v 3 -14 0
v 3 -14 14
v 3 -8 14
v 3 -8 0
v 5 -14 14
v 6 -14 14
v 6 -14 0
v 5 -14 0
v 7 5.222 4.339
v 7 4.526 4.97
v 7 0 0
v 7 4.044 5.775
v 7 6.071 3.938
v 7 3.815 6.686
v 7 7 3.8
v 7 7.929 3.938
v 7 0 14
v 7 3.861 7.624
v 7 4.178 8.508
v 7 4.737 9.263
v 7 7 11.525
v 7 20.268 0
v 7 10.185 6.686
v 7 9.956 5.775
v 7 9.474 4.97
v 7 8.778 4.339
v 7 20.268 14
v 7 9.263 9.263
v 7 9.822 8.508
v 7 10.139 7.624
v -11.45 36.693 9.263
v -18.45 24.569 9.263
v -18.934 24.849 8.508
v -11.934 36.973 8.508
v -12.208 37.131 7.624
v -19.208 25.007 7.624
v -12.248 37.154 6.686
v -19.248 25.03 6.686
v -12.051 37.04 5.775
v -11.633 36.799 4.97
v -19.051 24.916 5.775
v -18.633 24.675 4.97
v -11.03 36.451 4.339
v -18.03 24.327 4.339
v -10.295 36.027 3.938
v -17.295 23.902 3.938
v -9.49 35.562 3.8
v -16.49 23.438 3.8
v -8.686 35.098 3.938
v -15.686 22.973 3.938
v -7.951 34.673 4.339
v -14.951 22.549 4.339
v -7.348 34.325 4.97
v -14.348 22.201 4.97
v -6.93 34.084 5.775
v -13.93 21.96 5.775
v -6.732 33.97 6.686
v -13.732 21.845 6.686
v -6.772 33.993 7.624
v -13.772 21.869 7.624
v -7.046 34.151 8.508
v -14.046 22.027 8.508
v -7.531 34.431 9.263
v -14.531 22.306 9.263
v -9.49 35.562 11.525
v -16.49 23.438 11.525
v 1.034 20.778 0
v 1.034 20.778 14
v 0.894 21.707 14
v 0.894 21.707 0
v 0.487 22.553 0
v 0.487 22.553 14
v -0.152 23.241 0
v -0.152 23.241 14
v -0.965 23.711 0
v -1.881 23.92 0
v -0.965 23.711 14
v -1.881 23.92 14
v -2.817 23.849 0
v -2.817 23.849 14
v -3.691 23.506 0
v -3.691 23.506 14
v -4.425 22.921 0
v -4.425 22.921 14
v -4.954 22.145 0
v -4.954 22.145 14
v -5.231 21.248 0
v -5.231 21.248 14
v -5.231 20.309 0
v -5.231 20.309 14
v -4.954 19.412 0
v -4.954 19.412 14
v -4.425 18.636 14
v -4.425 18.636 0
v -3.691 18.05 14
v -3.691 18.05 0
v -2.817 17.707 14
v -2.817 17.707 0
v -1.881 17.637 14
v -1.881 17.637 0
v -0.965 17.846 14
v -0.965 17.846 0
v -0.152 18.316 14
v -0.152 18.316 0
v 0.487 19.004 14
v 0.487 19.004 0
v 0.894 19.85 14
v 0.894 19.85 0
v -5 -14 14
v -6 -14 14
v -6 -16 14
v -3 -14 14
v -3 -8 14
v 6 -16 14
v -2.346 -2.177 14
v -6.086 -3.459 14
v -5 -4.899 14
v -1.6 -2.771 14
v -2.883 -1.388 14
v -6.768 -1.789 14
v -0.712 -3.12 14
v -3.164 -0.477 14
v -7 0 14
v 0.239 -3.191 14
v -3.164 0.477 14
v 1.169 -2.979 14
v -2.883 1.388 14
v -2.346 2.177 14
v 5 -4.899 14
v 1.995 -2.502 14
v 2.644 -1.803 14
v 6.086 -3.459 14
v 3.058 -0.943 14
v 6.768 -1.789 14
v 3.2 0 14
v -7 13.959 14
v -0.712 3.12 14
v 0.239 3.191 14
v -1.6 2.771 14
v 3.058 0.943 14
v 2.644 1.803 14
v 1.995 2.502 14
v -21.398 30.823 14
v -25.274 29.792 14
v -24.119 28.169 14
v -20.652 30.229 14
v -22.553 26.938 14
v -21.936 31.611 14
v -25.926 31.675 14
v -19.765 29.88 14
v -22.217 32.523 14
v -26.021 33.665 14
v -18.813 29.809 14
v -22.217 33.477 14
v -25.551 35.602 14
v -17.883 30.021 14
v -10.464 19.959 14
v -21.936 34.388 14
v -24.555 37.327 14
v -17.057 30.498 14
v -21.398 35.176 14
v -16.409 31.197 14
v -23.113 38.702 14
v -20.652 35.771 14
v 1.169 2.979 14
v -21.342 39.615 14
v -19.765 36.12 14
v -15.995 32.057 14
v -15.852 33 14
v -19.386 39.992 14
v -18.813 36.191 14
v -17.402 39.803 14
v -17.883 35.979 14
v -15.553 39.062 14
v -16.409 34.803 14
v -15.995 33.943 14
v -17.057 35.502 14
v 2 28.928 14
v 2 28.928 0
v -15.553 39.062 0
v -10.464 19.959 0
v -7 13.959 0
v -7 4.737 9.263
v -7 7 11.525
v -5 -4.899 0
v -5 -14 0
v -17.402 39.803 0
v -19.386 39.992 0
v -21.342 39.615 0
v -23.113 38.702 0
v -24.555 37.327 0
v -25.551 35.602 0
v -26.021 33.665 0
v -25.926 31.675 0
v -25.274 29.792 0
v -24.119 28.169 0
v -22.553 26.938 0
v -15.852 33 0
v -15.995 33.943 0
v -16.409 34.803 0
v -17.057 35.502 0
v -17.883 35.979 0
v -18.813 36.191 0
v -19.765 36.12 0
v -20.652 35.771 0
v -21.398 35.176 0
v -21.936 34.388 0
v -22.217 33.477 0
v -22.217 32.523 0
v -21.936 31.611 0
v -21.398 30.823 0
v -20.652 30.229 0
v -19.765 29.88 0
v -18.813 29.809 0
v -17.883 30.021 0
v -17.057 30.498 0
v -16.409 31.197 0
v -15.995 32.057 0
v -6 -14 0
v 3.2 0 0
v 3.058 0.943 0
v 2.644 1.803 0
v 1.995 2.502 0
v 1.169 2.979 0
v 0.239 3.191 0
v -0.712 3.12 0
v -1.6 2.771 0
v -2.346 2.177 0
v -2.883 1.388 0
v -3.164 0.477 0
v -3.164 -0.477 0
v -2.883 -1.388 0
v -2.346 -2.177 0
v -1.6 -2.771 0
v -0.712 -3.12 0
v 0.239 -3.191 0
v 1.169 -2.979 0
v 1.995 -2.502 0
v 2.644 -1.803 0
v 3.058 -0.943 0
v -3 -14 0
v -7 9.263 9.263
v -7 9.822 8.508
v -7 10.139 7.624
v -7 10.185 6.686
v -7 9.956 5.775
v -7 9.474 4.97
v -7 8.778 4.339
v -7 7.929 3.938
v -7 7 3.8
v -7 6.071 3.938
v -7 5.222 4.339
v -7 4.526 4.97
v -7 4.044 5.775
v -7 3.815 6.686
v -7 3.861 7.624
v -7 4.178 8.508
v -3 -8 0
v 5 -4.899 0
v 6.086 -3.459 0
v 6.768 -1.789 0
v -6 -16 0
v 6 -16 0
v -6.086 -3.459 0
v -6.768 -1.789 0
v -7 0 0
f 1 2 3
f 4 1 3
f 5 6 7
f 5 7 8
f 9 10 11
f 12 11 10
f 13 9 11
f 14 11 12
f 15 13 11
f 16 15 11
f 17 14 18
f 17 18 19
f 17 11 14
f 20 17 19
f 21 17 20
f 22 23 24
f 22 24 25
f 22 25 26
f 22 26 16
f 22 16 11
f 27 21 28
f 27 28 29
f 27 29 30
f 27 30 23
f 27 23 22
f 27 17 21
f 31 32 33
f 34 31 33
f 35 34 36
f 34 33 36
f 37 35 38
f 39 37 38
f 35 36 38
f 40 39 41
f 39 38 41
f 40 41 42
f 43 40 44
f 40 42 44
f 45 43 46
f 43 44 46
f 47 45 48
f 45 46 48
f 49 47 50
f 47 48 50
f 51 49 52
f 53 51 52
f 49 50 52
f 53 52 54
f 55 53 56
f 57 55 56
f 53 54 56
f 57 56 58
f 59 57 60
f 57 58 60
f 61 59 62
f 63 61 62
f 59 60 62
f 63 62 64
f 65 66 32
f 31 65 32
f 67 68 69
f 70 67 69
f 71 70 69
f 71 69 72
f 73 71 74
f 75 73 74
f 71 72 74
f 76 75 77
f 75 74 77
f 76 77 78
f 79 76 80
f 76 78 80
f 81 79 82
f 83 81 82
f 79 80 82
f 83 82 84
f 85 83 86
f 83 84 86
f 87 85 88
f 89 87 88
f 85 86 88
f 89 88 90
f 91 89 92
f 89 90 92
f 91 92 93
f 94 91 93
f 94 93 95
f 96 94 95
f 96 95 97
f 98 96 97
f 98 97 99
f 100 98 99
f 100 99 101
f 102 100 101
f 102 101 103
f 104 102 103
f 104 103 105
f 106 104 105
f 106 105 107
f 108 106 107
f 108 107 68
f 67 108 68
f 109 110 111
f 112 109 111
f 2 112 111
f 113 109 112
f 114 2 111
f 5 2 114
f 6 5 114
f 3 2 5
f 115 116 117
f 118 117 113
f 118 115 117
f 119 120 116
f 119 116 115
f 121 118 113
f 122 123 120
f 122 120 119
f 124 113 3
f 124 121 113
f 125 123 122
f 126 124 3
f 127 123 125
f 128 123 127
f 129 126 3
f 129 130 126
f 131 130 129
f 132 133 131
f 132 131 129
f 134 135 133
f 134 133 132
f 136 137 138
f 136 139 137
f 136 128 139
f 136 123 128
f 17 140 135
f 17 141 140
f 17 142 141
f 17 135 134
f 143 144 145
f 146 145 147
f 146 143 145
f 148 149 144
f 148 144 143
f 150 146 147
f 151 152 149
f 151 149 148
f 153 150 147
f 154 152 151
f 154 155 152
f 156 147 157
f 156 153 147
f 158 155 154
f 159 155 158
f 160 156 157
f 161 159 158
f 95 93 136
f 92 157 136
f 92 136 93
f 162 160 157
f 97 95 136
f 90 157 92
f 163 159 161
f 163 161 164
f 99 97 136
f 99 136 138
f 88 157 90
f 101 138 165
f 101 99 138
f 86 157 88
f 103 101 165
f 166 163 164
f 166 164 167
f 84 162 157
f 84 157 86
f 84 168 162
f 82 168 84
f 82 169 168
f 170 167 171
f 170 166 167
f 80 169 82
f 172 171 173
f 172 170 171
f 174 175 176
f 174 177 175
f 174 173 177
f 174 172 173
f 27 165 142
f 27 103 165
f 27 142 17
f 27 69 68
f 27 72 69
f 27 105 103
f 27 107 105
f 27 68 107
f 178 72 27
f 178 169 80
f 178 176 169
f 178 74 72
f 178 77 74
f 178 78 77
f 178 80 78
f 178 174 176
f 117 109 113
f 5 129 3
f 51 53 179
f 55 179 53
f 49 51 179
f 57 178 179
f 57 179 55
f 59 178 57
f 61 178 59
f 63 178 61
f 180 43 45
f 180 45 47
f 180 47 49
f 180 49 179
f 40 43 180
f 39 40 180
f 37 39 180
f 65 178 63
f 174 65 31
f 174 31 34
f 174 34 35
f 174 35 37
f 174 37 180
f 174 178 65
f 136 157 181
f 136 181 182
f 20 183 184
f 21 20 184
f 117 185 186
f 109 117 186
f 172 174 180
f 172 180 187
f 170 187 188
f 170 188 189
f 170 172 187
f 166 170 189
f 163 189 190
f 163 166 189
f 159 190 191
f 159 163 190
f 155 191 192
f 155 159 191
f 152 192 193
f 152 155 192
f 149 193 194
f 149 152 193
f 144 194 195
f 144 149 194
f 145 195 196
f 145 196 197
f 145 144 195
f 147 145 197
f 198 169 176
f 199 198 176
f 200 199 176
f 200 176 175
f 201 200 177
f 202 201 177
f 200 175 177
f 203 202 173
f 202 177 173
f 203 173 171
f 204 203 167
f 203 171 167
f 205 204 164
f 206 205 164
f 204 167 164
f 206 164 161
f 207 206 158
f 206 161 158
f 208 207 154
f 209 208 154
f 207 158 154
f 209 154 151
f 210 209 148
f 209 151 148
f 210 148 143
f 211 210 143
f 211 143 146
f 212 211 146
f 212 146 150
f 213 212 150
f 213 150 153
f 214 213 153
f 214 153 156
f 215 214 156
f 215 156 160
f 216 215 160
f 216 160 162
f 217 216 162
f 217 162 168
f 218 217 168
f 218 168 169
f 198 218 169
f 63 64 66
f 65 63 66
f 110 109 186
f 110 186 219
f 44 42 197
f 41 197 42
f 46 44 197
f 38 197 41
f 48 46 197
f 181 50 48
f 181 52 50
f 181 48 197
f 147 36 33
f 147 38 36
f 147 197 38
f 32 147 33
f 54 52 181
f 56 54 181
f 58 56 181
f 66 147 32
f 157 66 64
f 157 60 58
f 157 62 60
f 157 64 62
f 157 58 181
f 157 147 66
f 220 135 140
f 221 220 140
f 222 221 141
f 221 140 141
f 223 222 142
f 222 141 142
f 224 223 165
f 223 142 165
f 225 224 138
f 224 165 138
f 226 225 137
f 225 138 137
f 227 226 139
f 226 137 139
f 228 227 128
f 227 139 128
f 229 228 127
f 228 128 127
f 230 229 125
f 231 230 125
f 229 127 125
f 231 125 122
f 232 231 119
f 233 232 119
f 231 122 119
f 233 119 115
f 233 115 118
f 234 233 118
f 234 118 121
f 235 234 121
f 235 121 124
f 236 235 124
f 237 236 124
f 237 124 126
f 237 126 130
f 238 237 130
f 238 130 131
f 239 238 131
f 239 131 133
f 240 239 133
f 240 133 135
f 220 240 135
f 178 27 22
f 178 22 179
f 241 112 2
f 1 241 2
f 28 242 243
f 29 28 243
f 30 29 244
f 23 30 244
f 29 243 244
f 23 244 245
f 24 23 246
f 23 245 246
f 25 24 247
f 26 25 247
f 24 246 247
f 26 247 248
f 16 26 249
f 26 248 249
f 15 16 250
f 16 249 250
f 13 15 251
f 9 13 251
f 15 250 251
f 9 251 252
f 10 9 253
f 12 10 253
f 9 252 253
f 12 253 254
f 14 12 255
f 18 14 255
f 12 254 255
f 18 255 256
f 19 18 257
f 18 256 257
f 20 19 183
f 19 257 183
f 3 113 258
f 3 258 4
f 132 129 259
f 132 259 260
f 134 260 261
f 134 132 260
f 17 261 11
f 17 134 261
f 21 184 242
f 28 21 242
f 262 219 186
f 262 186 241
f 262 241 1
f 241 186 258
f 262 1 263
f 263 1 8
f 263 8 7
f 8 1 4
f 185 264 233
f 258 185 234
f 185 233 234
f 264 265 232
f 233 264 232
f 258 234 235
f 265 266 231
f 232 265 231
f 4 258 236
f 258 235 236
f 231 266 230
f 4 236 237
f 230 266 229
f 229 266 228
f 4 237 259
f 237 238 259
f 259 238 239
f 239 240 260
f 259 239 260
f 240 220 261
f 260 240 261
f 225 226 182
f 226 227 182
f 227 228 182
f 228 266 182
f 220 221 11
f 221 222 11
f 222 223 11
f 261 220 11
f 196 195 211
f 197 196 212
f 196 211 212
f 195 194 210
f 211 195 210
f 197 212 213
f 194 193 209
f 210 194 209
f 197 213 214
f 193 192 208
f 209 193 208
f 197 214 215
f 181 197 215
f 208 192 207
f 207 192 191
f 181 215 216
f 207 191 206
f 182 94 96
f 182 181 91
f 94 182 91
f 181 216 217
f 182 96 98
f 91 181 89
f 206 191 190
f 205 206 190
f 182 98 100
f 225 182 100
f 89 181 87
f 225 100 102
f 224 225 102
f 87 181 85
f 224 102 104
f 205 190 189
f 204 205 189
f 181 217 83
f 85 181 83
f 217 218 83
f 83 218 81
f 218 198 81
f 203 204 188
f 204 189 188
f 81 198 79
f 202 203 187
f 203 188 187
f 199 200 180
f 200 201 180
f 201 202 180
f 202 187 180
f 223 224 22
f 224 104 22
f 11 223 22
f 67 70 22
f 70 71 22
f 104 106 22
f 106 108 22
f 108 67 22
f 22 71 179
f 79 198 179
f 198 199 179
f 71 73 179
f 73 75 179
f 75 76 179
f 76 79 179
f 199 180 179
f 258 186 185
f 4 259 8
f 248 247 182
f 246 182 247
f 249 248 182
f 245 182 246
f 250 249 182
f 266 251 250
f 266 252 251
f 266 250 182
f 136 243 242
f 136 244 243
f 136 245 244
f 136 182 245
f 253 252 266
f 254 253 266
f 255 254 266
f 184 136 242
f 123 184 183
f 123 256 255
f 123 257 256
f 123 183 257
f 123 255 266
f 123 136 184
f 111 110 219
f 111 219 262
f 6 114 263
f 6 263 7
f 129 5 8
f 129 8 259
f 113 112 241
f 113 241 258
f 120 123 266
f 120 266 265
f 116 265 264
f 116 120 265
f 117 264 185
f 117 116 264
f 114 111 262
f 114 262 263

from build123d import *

# Parameters (mm, degrees)
SKETCH1_W           = 6
SKETCH1_H           = 6
BOSS_EXTRUDE1_DEPTH = 14
HOLE2_D             = 6.4
HOLE2_DEPTH         = 14
HOLE1_D             = 6.4
CUT_EXTRUDE2_DEPTH  = 15
CUT_EXTRUDE1_DEPTH  = 27.088457268
SKETCH8_R           = 3.15
CUT_EXTRUDE3_DEPTH  = 15


with BuildPart() as part:
    # Sketch1 → Boss-Extrude1 (new body)
    with BuildSketch(Plane.XY.offset(14)):
        with BuildLine():
            Line((7, 0), (7, 20.267949192))
            Line((7, 20.267949192), (2, 28.92820323))
            Line((2, 28.92820323), (-15.552558883, 39.062177826))
            ThreePointArc((-15.552558883, 39.062177826), (-25.11473671, 36.5), (-22.552558883, 26.937822174))
            Line((-22.552558883, 26.937822174), (-10.464101615, 19.958548116))
            Line((-10.464101615, 19.958548116), (-7, 13.958548116))
            Line((-7, 13.958548116), (-7, 0))
            ThreePointArc((-7, 0), (-6.480740698, -2.645751311), (-5, -4.898979486))
            Line((-5, -4.898979486), (-5, -14))
            Line((-5, -14), (-6, -14))
            Line((-6, -14), (-6, -16))
            Line((-6, -16), (6, -16))
            Line((6, -16), (6, -14))
            Line((6, -14), (5, -14))
            Line((5, -14), (5, -4.898979486))
            ThreePointArc((5, -4.898979486), (6.480740698, -2.645751311), (7, 0))
        make_face()
        with Locations((0, -11)):
            Rectangle(SKETCH1_W, SKETCH1_H, mode=Mode.SUBTRACT)
    extrude(amount=-BOSS_EXTRUDE1_DEPTH)

    # Hole2
    with Locations(Plane(origin=(0, 0, 0), x_dir=(-1, 0, 0), z_dir=(0, 0, -1))):
        with Locations((19.0525, 32.999898011)):
            Hole(HOLE2_D / 2, depth=HOLE2_DEPTH)

    # Hole1 (through all)
    with Locations(Plane(origin=(0, 0, 0), x_dir=(-1, 0, 0), z_dir=(0, 0, -1))):
        with Locations((0, 0)):
            Hole(HOLE1_D / 2)

    # Sketch3 → Cut-Extrude2 (cut, through all)
    with BuildSketch(Plane.ZY.offset(7)):
        with BuildLine():
            Line((9.2627417, 4.7372583), (11.5254834, 7))
            Line((11.5254834, 7), (9.2627417, 9.2627417))
            ThreePointArc((9.2627417, 9.2627417), (3.8, 7), (9.2627417, 4.7372583))
        make_face()
    extrude(amount=-CUT_EXTRUDE2_DEPTH, mode=Mode.SUBTRACT)

    # Sketch2 → Cut-Extrude1 (cut, through all)
    with BuildSketch(Plane(origin=(6.026279442, 10.437822174, 0), x_dir=(0.866025404, -0.5, 0), z_dir=(-0.5, -0.866025404, 0))):
        with BuildLine():
            Line((-25.999898011, 11.5254834), (-28.262639711, 9.2627417))
            ThreePointArc((-28.262639711, 9.2627417), (-25.999898011, 3.8), (-23.737156311, 9.2627417))
            Line((-23.737156311, 9.2627417), (-25.999898011, 11.5254834))
        make_face()
    extrude(amount=-CUT_EXTRUDE1_DEPTH, mode=Mode.SUBTRACT)

    # Sketch8 → Cut-Extrude3 (cut, through all)
    with BuildSketch(Plane.XY.offset(14)):
        with Locations((-2.116025404, 20.778312164)):
            Circle(SKETCH8_R)
    extrude(amount=-CUT_EXTRUDE3_DEPTH, mode=Mode.SUBTRACT)


solid = part.part
